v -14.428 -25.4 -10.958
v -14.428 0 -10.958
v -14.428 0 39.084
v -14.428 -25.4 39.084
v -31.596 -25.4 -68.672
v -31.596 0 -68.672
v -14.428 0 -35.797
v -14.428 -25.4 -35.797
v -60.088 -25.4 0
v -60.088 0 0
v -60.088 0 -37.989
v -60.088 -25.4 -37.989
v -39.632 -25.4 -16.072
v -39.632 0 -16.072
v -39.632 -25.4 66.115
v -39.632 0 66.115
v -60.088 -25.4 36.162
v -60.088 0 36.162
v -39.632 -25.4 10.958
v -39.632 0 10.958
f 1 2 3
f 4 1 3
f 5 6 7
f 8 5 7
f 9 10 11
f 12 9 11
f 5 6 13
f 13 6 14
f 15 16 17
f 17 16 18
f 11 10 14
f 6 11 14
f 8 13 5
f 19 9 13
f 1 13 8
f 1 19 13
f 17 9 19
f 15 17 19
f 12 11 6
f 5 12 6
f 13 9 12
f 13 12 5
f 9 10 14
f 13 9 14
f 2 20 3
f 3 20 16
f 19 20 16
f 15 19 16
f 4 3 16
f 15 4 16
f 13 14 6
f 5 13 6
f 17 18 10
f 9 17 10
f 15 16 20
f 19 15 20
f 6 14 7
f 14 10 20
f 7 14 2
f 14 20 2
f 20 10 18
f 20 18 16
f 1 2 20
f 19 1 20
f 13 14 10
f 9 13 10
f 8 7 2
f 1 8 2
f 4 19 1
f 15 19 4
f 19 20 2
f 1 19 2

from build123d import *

# Parameters (mm, degrees)
F1_DEPTH = 25.4
F3_D     = 6.35
F5_D     = 6.35
F9_DEPTH = 25.4


with BuildPart() as f1:
    # F0 (on Front) → F1 (new body)
    with BuildSketch(Plane.XZ):
        with BuildLine():
            ThreePointArc((-128.3751209868, 39.6007452949), (-129.552340494, 9.5896363142), (-103.3479430395, 24.2655370384))
            ThreePointArc((-103.3479430395, 24.2655370384), (-104.9362182853, 31.4871507031), (-109.4079183306, 37.3759723918))
            ThreePointArc((-109.4079183306, 37.3759723918), (-118.5546653052, 41.3601956851), (-128.3751209868, 39.6007452949))
        make_face()
        with BuildLine():
            ThreePointArc((-128.3751209868, 39.6007452949), (-118.5546653052, 41.3601956851), (-109.4079183306, 37.3759723918))
            Line((-109.4079183306, 37.3759723918), (-106.4278815586, 143.8075241849))
            ThreePointArc((-106.4278815586, 143.8075241849), (-115.3981395679, 141.5406720569), (-124.418582657, 143.5987667583))
            Line((-124.418582657, 143.5987667583), (-128.3751209868, 39.6007452949))
        make_face()
        with BuildLine():
            ThreePointArc((-124.418582657, 143.5987667583), (-115.3981395679, 141.5406720569), (-106.4278815586, 143.8075241849))
            ThreePointArc((-106.4278815586, 143.8075241849), (-98.6897050309, 151.0931461836), (-95.8360031708, 161.3311171532))
            ThreePointArc((-95.8360031708, 161.3311171532), (-126.0615922734, 178.149262864), (-124.418582657, 143.5987667583))
        make_face()
    extrude(amount=F1_DEPTH)

    # F3 (through all)
    with Locations(Plane(origin=(0, 0, 0), x_dir=(1, 0, 0), z_dir=(0, 1, 0))):
        with Locations((-119.4135472178, -24.9353405088)):
            Hole(F3_D / 2)

    # F5 (through all)
    with Locations(Plane(origin=(0, 0, 0), x_dir=(1, 0, 0), z_dir=(0, 1, 0))):
        with Locations((-114.6405717434, -176.6452617808)):
            Hole(F5_D / 2)


with BuildPart() as f9:
    # F8 (on face) → F9 (new body)
    with BuildSketch(Plane.XZ):
        Polygon((-14.4283715636, -10.9582594596), (-39.6323725581, 10.9582599252), (-39.6323725581, 66.1148354411), (-60.0877888501, 36.1622571945), (-60.0877888501, 0), (-39.6323725581, -16.0721149296), (-31.596314162, -68.6717629433), (-14.4283715636, -35.7969813049), align=None)
    extrude(amount=F9_DEPTH)


with BuildPart() as f9b:
    # F7 (on Front) → F9, piece 2 (new body)
    with BuildSketch(Plane.XZ):
        Polygon((-14.4283715636, 39.084456861), (-39.6323725581, 66.1148354411), (-39.6323725581, 10.9582599252), (-14.4283715636, -10.9582594596), (-14.4283715636, 13.8804623857), align=None)
    extrude(amount=F9_DEPTH)


with BuildPart() as f9c:
    # F7 (on Front) → F9, piece 3 (new body)
    with BuildSketch(Plane.XZ):
        Polygon((-39.6323725581, -16.0721149296), (-60.0877888501, 0), (-60.0877888501, -37.9886329174), (-31.596314162, -68.6717629433), align=None)
    extrude(amount=F9_DEPTH)


solid = Compound([f9.part, f9b.part, f9c.part])
